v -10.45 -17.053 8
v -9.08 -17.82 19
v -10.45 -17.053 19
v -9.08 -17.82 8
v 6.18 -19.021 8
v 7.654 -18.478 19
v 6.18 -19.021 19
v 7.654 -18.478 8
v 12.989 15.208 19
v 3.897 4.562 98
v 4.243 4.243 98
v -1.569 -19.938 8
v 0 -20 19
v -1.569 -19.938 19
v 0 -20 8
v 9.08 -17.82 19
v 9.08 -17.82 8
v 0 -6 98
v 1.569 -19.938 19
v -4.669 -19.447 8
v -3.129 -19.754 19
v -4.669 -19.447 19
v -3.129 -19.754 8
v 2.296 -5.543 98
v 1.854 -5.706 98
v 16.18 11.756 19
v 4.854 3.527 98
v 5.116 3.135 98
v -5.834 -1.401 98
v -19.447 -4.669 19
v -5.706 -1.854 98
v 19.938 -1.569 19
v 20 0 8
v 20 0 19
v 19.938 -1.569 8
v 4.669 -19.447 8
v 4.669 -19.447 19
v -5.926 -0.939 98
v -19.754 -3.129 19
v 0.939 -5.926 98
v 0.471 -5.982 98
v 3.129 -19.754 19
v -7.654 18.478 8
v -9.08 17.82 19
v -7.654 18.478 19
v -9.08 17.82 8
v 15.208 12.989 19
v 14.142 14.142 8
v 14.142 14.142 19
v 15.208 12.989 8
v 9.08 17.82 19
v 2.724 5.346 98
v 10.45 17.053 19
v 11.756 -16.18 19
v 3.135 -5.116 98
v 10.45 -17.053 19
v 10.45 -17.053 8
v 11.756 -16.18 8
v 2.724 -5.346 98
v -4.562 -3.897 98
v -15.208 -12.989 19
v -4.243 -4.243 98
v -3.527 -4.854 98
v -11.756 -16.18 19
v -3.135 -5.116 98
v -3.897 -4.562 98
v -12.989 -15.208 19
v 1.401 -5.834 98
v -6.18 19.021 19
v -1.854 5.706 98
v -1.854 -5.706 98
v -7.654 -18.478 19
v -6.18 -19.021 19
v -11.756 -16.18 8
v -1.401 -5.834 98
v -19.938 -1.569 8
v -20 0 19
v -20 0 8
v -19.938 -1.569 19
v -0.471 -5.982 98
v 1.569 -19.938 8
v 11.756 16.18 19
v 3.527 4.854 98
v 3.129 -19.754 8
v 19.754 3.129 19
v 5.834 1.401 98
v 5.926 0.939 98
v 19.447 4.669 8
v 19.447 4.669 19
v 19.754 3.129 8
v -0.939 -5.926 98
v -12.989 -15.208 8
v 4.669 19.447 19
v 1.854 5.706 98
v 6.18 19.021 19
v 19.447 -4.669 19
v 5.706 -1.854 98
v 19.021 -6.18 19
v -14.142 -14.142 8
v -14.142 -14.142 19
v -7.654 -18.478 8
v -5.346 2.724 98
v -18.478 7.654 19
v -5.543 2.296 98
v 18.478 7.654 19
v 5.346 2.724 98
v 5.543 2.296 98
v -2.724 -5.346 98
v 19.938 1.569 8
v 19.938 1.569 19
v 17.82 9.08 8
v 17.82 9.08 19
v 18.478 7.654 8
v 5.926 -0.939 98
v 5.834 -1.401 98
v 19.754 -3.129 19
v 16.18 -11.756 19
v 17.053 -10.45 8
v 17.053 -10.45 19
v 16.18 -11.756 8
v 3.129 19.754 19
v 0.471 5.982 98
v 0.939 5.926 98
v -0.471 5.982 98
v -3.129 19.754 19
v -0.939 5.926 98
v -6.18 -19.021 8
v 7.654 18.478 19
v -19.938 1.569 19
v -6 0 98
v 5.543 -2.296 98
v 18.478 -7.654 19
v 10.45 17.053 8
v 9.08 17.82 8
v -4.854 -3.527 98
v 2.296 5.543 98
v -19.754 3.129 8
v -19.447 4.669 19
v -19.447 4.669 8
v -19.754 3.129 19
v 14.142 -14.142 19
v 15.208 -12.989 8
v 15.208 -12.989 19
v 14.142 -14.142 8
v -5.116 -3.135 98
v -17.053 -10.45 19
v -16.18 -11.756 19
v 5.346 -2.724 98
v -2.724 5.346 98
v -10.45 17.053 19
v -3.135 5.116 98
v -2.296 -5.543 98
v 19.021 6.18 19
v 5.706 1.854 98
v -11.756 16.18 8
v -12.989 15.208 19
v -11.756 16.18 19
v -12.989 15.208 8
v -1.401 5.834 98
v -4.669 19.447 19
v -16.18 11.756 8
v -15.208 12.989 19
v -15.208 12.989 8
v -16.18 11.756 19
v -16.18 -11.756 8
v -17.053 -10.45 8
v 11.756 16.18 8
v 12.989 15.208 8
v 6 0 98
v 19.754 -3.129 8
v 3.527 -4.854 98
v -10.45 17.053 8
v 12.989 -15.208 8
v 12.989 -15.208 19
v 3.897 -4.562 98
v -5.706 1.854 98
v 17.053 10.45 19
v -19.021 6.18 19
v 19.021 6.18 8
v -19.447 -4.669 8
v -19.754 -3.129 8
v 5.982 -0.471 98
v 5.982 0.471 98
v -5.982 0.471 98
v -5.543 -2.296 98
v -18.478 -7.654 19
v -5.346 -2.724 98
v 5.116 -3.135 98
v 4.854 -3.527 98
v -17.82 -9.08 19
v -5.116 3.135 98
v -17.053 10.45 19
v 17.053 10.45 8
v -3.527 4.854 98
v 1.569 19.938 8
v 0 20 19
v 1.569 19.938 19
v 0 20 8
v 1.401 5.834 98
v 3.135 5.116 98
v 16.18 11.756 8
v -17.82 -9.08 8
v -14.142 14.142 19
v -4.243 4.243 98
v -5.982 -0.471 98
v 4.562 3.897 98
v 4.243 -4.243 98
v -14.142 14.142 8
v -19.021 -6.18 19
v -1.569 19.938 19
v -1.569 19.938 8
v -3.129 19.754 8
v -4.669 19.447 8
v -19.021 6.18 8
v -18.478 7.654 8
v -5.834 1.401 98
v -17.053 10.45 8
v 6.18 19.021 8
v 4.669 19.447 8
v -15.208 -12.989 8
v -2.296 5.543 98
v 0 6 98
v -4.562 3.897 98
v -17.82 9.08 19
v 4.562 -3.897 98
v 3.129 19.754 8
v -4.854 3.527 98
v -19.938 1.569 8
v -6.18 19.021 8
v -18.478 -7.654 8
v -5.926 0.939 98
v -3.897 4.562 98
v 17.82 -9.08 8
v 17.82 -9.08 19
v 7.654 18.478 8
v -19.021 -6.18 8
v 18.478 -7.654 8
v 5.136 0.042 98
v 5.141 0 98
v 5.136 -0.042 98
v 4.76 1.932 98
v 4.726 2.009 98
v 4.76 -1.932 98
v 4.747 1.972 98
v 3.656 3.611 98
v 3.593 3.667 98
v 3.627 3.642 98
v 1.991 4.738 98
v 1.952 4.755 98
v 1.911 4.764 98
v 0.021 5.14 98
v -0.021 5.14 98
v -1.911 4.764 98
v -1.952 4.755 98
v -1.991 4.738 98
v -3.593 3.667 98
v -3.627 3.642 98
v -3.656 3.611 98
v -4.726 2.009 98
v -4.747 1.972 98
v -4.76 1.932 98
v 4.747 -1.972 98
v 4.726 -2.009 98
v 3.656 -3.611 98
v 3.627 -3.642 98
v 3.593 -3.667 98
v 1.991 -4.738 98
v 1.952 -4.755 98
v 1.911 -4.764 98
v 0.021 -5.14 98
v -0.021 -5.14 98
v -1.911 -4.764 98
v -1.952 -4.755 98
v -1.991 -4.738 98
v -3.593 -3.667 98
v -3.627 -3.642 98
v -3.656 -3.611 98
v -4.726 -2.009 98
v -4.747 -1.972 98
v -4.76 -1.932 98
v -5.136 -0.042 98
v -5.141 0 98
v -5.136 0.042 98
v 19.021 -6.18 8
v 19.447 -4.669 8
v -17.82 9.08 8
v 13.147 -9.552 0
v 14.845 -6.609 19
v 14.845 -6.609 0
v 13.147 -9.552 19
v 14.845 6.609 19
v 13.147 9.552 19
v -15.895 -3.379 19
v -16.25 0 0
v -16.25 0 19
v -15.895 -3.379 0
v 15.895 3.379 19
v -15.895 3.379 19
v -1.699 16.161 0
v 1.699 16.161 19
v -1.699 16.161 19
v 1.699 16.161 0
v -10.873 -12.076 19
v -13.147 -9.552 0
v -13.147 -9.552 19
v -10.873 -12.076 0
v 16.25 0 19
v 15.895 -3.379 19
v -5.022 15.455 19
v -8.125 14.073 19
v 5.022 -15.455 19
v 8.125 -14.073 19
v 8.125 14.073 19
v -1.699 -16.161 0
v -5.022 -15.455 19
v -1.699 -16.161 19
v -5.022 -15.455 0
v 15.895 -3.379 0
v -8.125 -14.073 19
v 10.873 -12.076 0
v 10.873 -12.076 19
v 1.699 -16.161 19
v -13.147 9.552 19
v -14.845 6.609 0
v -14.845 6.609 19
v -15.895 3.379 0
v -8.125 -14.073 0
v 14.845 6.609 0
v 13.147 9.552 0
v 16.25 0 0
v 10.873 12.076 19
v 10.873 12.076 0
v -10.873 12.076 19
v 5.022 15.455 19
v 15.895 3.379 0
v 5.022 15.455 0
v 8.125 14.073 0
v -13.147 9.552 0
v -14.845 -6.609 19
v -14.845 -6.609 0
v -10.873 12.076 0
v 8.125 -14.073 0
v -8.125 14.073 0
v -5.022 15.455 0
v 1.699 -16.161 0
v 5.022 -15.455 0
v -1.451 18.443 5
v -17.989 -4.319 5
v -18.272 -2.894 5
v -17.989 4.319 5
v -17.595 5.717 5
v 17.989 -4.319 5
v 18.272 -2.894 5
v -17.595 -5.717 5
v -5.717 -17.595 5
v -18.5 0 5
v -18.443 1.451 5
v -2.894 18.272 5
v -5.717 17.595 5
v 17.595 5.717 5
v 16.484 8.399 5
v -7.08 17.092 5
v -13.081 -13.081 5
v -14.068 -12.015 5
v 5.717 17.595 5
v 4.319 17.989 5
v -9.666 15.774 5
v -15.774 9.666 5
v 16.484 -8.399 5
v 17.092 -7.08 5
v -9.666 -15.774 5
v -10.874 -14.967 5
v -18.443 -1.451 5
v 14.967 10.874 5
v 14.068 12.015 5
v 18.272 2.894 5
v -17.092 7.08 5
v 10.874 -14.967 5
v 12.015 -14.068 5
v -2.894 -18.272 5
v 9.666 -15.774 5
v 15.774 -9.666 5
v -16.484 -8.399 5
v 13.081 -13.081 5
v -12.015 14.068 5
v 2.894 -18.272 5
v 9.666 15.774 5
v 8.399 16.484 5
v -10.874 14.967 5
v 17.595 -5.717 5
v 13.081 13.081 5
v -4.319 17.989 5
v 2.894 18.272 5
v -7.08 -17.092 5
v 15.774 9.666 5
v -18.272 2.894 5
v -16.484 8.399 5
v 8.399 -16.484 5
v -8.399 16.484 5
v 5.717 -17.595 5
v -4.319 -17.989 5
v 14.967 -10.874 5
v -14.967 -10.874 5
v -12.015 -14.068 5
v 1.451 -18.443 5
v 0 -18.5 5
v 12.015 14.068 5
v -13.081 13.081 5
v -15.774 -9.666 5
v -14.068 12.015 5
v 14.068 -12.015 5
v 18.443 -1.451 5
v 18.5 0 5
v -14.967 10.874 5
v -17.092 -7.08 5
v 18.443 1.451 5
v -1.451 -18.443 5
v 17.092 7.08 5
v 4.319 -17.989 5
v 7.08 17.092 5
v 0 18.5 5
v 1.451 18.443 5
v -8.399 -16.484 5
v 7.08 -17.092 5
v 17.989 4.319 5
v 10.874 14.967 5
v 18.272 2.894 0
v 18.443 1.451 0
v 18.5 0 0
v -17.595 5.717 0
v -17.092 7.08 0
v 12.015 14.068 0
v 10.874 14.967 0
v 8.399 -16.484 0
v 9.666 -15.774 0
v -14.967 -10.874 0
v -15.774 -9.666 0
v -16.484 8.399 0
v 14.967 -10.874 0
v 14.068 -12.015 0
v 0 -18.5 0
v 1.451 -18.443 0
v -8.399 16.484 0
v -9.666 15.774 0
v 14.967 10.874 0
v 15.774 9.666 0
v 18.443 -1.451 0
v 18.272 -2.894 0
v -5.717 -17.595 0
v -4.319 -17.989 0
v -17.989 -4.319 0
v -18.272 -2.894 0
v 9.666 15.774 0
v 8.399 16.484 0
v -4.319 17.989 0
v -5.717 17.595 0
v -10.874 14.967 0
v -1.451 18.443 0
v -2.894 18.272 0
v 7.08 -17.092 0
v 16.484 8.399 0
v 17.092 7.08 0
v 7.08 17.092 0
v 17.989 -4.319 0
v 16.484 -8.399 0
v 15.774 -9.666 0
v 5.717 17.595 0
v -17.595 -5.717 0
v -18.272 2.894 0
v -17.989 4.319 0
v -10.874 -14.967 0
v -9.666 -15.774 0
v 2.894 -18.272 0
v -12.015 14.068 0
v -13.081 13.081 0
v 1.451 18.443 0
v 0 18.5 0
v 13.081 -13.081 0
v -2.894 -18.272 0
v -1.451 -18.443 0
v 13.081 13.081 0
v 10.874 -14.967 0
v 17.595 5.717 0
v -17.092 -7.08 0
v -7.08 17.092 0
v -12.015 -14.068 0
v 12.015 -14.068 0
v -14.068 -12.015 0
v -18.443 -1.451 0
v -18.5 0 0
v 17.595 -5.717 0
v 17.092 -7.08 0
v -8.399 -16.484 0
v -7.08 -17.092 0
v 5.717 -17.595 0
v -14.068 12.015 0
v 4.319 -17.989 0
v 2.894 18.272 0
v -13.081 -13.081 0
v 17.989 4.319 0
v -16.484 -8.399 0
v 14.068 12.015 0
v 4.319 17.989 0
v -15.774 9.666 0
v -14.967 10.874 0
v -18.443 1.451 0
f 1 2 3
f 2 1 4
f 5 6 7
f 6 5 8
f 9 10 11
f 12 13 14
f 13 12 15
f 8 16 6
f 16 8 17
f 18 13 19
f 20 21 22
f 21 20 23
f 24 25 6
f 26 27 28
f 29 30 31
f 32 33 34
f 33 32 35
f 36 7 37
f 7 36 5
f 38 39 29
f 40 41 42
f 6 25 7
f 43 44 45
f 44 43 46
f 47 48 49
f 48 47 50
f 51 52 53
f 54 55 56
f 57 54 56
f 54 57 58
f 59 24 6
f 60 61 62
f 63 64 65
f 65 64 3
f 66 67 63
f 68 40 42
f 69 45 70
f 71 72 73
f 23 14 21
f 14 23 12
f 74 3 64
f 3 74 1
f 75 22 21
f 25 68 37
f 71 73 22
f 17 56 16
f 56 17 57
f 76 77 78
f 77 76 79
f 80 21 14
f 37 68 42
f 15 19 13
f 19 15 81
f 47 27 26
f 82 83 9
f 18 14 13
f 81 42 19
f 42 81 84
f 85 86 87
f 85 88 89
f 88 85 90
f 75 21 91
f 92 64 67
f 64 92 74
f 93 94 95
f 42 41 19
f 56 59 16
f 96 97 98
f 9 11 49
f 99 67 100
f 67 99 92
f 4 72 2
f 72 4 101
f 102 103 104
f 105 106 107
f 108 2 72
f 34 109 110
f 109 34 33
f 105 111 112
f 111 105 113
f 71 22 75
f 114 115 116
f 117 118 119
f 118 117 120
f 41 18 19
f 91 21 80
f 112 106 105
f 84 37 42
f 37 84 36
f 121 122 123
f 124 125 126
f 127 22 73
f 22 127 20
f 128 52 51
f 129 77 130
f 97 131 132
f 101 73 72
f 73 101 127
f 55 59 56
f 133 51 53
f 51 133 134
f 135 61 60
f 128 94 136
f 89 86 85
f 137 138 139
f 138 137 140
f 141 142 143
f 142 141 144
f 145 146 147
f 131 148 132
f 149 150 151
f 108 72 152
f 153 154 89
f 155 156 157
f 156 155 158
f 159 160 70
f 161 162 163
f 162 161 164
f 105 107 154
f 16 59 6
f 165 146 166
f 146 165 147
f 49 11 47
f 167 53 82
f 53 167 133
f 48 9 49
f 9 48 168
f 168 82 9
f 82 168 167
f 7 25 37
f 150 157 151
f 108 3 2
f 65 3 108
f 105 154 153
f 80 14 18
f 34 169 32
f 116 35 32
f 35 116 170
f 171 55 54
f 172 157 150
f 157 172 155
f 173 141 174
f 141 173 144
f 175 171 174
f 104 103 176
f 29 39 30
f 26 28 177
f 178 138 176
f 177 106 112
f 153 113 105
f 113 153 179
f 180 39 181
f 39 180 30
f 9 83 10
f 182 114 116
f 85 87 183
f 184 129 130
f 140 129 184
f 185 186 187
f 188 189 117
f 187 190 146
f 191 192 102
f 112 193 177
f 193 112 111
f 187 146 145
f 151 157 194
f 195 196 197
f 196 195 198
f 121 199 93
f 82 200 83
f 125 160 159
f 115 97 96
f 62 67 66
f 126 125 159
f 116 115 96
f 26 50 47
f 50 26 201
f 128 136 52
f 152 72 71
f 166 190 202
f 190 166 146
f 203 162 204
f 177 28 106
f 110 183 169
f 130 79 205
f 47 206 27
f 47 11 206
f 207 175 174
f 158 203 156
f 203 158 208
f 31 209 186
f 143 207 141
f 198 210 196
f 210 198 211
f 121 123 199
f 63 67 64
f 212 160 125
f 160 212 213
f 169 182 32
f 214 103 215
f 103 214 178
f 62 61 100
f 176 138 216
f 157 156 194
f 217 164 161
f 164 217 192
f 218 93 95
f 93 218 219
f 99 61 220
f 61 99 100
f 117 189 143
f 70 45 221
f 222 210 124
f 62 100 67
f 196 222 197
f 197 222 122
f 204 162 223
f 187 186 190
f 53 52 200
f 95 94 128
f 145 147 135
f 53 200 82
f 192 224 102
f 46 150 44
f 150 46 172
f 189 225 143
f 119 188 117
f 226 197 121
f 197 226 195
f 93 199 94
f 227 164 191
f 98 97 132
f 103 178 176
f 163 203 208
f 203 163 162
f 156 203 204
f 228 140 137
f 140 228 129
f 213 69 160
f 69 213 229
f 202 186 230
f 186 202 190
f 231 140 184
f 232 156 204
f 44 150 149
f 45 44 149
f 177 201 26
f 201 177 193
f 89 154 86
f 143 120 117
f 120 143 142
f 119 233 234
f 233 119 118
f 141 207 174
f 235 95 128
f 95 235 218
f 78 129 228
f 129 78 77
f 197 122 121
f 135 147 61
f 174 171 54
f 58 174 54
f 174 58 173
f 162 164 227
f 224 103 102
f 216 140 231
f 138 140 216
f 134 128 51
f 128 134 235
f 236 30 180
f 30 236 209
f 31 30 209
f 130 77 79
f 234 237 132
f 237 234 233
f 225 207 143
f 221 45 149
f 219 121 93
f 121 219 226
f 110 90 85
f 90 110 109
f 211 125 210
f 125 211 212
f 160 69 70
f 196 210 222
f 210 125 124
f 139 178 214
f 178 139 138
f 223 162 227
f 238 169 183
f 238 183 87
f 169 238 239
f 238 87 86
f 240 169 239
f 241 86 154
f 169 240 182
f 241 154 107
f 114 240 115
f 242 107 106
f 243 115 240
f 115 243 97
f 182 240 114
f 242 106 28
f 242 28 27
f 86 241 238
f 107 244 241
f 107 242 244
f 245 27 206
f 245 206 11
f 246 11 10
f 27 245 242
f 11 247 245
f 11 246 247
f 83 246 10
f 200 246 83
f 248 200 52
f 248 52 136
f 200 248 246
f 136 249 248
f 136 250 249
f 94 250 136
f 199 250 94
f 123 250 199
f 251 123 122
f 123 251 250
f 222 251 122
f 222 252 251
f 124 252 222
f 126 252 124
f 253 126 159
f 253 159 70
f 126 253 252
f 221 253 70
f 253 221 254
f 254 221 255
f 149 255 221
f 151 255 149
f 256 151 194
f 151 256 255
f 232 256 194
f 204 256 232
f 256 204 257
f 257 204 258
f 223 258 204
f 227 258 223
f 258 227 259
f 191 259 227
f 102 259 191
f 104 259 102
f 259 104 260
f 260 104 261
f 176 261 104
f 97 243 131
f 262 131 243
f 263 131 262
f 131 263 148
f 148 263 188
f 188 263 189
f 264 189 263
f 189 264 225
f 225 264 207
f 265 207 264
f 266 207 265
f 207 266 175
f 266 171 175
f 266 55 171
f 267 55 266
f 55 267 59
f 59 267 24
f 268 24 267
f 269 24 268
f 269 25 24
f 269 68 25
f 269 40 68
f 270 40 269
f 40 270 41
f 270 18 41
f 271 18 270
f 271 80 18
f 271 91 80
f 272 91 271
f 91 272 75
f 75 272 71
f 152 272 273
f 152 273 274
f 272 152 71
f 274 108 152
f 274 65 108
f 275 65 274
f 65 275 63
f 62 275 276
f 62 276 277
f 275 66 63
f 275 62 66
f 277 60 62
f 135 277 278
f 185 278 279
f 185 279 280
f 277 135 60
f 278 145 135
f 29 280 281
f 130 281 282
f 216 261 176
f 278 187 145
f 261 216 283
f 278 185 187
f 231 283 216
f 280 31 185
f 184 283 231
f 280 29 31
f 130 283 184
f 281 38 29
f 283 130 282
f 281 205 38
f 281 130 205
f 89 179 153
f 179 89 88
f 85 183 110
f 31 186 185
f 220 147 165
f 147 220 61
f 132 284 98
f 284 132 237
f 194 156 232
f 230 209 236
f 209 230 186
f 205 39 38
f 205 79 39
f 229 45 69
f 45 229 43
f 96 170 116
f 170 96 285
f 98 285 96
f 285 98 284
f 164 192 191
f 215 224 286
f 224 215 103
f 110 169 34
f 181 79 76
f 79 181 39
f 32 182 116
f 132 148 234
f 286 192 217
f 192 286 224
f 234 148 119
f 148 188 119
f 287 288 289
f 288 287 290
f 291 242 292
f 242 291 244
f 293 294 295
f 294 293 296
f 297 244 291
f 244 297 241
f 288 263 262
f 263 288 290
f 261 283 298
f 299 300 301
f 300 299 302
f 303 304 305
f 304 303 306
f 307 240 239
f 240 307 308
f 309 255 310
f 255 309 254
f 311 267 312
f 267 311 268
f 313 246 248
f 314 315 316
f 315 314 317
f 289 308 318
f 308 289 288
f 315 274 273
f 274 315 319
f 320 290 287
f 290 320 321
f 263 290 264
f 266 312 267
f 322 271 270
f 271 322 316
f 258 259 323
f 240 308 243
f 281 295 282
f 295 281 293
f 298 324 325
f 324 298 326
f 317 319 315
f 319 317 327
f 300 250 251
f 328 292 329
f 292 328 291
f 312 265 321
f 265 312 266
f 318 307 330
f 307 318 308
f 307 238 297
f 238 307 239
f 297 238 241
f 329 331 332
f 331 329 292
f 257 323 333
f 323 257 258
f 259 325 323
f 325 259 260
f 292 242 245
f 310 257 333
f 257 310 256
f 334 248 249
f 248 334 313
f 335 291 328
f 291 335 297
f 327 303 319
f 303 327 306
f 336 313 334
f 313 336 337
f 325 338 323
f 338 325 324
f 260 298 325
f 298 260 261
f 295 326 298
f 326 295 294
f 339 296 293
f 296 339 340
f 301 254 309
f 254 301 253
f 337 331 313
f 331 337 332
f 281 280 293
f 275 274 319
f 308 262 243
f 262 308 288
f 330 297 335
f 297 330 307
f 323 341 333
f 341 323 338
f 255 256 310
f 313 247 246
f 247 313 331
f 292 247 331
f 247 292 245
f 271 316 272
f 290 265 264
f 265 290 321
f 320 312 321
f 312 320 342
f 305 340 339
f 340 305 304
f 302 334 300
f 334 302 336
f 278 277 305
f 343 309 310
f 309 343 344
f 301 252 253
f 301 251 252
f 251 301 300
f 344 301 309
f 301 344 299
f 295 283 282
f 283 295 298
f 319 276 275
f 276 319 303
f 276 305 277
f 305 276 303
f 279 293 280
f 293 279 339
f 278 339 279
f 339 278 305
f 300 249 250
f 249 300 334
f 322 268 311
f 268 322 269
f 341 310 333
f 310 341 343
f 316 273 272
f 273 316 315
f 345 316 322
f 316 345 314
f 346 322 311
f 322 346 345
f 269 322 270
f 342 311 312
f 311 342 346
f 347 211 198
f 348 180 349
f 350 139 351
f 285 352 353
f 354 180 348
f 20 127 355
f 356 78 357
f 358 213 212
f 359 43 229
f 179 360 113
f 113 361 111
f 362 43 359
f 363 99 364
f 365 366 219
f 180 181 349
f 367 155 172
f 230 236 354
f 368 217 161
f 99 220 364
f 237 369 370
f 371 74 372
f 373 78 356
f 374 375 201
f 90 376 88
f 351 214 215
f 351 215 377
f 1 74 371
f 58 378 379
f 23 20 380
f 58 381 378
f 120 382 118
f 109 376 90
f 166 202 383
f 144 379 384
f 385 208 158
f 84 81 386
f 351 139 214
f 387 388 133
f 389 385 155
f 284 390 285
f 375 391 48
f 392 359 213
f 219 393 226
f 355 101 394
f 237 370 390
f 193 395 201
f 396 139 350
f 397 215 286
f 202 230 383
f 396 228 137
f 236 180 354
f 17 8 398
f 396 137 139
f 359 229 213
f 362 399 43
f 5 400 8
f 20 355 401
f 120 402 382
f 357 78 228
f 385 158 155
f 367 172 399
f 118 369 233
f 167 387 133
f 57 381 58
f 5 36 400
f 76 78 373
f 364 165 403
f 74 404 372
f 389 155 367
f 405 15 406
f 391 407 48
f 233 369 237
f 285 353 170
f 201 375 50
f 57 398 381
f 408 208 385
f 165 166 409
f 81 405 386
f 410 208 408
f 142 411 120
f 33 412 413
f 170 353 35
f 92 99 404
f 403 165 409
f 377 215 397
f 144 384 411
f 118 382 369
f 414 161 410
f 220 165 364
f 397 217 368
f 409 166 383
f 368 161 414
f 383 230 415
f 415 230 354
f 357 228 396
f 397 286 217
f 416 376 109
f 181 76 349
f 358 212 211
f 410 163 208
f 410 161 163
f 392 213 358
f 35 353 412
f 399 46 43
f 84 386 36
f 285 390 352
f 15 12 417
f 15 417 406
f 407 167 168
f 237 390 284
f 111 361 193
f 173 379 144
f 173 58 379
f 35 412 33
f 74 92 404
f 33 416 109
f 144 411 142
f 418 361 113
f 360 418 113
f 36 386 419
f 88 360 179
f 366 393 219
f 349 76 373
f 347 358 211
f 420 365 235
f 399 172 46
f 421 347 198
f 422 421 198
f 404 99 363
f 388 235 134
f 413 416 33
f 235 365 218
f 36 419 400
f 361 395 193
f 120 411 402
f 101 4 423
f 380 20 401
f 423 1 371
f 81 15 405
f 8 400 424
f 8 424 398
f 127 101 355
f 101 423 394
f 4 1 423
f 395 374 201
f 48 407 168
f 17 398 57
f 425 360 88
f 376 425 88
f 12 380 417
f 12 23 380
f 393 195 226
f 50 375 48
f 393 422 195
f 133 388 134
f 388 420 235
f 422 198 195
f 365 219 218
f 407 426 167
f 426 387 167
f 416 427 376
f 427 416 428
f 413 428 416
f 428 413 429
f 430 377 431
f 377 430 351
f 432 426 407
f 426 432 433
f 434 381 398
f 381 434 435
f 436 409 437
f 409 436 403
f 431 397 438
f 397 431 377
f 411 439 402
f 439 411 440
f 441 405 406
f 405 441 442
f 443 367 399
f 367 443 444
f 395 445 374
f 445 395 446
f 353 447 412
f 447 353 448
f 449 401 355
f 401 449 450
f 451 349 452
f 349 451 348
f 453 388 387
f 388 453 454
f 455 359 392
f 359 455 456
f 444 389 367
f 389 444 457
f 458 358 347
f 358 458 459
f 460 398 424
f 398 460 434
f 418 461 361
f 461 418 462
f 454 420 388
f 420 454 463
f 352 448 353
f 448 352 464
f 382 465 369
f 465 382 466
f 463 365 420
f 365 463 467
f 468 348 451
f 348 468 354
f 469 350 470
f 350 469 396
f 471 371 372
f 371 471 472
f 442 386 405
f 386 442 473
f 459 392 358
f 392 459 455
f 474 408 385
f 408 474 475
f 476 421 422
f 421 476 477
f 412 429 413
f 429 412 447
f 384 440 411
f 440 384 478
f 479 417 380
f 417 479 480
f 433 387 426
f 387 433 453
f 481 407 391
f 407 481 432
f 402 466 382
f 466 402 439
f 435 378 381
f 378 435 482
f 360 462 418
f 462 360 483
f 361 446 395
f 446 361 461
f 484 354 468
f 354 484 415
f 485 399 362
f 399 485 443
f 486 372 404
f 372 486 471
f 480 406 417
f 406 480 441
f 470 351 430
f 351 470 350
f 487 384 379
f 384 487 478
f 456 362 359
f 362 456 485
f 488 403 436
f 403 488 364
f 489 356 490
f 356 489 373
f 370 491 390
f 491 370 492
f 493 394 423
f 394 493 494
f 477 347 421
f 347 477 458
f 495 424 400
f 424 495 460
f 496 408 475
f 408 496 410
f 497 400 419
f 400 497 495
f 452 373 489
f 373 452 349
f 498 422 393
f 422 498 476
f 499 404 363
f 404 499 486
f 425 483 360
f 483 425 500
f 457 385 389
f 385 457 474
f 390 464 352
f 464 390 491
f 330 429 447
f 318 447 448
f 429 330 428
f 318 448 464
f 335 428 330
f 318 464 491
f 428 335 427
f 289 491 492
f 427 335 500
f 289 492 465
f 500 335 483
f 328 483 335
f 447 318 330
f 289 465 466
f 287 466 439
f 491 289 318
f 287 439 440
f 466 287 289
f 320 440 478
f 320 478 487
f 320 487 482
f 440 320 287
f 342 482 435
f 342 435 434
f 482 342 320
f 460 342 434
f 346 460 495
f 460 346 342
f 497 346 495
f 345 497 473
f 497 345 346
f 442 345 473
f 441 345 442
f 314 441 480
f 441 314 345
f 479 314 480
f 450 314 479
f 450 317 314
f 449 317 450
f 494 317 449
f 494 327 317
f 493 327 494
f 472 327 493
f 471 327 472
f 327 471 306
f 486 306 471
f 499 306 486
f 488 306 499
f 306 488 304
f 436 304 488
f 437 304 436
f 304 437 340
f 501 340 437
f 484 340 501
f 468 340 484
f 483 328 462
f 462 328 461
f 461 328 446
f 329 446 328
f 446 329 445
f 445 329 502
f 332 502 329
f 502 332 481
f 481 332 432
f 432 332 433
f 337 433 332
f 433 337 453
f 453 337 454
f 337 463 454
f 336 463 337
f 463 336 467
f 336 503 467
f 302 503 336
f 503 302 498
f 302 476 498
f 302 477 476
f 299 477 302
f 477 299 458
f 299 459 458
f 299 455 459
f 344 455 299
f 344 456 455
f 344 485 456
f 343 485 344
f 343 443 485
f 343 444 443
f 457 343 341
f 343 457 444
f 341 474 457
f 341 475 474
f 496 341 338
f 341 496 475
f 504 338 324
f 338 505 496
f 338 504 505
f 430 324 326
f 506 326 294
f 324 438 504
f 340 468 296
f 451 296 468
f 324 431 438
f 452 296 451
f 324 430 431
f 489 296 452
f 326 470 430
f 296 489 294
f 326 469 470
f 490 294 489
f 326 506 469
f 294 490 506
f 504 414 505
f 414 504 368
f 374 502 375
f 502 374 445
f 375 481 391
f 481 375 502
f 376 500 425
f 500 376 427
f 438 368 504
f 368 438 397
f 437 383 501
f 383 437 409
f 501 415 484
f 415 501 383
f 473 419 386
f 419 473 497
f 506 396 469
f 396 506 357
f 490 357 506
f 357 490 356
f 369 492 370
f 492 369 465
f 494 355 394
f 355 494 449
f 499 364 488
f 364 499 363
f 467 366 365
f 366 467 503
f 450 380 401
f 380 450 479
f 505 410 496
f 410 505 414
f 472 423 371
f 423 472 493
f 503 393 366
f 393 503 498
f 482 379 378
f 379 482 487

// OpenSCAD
// Hose attachment settings
hose_inner_diameter = 32.5;
hose_outer_diameter = 37;
hose_lip_diameter = 40;
hose_insert_length = 5;
hose_lip_length = 10;
hose_taper_length = 3;
overlap = 0.5;
smoothness = 80;

nozzle_join_length = 1;
nozzle_inner_diameter = 10;
nozzle_outer_diameter = 12;
nozzle_length = 80;

diameter_resolution = 10;

module dyson_attachment() {
  difference() {
    union() {
      translate([0,0,hose_insert_length]) hull() {
        translate([0,0,hose_taper_length]) cylinder(r= hose_lip_diameter/2, h=hose_lip_length, $fn=smoothness);
        cylinder(r= hose_outer_diameter/2, h=hose_taper_length+overlap, $fn=smoothness);
      }
      cylinder(r= hose_outer_diameter/2, h=hose_insert_length+overlap, $fn=smoothness);
    }
    translate([0,0,-overlap]) cylinder(r=hose_inner_diameter/2, h=hose_insert_length+hose_lip_length+hose_taper_length+3*overlap);
  }
}

module nozzle() {
  translate([0,0,hose_insert_length+hose_lip_length+hose_taper_length]) difference() {
    hull() {
      cylinder(r=nozzle_outer_diameter/2, h=nozzle_length, $fn=smoothness);
      cylinder(r=hose_lip_diameter/2, h=nozzle_join_length, $fn=smoothness);
    }
    translate([0,0,-overlap]) hull() {
      translate([0,0,2*overlap]) cylinder(r=nozzle_inner_diameter/2, h=nozzle_length+overlap);
      cylinder(r=hose_inner_diameter/2, h=nozzle_join_length+overlap);
    }
  }
}

// For testing fit, comment out the nozzle section for a quicker print
nozzle();
dyson_attachment();
